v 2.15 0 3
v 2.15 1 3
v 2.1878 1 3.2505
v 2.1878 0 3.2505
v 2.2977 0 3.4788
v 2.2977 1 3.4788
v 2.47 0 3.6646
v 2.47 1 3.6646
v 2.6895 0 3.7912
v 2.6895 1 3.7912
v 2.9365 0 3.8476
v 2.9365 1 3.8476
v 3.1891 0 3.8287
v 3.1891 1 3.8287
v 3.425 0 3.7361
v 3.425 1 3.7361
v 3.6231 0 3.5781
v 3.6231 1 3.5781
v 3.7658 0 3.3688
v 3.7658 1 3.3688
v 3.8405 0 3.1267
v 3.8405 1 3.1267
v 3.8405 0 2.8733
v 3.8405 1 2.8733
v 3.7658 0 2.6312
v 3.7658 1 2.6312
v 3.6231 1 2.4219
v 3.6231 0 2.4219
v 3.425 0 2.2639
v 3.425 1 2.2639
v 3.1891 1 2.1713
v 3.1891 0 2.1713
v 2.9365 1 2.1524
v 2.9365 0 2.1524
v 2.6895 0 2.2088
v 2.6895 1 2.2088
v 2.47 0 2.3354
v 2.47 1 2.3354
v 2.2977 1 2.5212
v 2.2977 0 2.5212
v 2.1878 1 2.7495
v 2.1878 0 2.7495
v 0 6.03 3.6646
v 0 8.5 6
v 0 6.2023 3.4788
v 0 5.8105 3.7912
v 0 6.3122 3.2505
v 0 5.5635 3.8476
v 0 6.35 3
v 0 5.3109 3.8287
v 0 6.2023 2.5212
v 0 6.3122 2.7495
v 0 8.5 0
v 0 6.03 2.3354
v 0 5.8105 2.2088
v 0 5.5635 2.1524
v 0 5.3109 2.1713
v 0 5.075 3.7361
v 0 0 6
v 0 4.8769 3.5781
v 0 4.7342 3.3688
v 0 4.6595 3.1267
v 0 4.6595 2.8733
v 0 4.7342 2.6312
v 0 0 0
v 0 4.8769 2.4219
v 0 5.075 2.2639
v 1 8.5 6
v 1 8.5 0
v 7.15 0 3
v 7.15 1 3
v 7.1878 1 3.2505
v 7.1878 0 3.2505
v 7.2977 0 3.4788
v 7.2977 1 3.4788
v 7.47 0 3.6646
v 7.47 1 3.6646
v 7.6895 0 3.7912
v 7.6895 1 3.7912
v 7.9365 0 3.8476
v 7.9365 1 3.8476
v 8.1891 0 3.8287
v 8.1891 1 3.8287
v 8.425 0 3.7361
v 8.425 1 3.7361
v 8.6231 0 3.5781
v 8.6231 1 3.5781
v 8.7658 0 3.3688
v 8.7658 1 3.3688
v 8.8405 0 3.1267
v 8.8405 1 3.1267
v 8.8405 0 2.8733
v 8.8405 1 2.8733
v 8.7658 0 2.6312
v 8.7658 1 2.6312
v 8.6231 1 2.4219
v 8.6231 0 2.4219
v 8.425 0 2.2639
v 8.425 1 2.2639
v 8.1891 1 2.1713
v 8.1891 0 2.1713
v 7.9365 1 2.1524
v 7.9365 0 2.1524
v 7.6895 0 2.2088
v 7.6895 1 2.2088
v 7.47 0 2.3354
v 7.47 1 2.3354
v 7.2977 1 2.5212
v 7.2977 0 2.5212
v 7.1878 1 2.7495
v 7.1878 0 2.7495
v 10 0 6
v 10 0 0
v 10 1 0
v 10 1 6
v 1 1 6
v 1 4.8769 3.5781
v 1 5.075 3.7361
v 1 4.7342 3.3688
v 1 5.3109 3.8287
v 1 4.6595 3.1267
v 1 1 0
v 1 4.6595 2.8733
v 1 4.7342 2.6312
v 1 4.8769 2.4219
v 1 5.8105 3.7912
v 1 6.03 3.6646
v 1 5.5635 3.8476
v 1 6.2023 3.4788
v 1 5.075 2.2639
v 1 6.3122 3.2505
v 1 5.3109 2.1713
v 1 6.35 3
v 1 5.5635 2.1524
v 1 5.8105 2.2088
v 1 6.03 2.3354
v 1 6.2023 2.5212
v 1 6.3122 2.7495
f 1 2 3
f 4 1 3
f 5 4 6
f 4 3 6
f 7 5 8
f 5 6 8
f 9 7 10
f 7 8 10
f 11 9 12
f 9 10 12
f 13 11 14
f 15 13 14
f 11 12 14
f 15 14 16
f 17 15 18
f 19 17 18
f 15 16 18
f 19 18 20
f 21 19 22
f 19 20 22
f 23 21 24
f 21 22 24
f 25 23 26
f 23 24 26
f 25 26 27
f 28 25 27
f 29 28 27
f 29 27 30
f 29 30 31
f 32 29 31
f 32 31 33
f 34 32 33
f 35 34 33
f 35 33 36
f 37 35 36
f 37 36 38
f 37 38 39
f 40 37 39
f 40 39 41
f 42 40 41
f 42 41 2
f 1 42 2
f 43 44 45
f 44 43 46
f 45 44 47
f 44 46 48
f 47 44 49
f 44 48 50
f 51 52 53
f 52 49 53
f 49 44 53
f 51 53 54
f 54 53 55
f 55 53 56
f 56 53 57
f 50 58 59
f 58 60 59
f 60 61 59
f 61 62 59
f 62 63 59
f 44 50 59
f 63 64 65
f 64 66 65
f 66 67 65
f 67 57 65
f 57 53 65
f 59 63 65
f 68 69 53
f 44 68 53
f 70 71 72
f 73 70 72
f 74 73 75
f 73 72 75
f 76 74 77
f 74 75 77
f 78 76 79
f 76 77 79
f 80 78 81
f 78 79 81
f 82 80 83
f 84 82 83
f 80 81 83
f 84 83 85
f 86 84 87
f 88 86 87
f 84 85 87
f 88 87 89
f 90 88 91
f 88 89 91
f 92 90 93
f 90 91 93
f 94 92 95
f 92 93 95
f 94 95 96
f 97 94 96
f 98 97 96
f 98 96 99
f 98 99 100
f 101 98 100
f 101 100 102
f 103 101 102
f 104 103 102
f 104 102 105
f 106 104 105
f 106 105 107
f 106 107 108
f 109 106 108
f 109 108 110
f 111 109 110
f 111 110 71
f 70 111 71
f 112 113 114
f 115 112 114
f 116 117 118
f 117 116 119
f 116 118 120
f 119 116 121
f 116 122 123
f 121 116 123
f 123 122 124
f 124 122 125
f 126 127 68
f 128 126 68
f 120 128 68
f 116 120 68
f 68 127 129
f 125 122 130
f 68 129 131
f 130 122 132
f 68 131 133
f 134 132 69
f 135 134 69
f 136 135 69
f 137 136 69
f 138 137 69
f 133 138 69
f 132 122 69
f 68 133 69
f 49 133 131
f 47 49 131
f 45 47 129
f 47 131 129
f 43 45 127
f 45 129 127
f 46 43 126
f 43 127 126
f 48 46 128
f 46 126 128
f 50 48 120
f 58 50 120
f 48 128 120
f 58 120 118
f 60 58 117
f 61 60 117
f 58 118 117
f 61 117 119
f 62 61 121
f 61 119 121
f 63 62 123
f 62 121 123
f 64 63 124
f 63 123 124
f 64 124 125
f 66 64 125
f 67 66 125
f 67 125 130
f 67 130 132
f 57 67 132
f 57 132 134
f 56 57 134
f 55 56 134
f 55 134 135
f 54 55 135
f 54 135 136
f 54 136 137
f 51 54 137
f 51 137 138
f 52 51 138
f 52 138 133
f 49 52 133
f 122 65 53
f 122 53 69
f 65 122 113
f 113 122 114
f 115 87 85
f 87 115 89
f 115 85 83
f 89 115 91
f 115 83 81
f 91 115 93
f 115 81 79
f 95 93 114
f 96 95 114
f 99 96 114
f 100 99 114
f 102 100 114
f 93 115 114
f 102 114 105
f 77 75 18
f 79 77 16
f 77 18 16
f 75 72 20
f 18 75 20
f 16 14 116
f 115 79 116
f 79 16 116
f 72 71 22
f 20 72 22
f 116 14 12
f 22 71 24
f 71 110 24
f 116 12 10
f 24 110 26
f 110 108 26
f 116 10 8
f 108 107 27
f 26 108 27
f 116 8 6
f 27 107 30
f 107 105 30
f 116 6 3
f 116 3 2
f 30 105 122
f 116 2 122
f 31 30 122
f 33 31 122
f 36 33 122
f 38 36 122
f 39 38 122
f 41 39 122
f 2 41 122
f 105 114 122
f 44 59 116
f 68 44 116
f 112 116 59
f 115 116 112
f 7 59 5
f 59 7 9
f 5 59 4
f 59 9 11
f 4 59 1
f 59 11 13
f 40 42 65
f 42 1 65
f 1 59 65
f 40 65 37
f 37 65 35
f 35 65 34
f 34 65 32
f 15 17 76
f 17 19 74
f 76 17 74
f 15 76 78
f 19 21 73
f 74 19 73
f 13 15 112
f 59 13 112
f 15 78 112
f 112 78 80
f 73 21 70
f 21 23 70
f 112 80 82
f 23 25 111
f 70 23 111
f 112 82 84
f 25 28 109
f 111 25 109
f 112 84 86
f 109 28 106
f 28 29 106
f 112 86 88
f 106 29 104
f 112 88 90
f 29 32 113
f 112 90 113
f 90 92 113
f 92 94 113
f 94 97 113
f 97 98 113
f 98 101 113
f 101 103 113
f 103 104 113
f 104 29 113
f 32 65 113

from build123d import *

# Parameters (mm, degrees)
BOSS_EXTRUDE2_DEPTH = 6
SKETCH4_R           = 0.85
CUT_EXTRUDE1_DEPTH  = 6
SKETCH6_R           = 0.85
CUT_EXTRUDE2_DEPTH  = 6


with BuildPart() as part:
    # Sketch3 → Boss-Extrude2 (new body)
    with BuildSketch(Plane.XY):
        Polygon((0, 0), (10, 0), (10, 1), (1, 1), (1, 8.5), (0, 8.5), align=None)
    extrude(amount=BOSS_EXTRUDE2_DEPTH)

    # Sketch4 → Cut-Extrude1 (cut)
    with BuildSketch(Plane(origin=(1, 0, 0), x_dir=(0, 0, -1), z_dir=(1, 0, 0))):
        with Locations(Location((-3, 5.5, 0), (0, 0, 90))):
            Circle(SKETCH4_R)
    extrude(amount=-CUT_EXTRUDE1_DEPTH, mode=Mode.SUBTRACT)

    # Sketch6 → Cut-Extrude2 (cut)
    with BuildSketch(Plane(origin=(0, 1, 0), x_dir=(1, 0, 0), z_dir=(0, 1, 0))):
        with Locations(Location((3, -3, 0), (0, 0, 180))):
            Circle(SKETCH6_R)
        with Locations(Location((8, -3, 0), (0, 0, 180))):
            Circle(SKETCH6_R)
    extrude(amount=-CUT_EXTRUDE2_DEPTH, mode=Mode.SUBTRACT)


solid = part.part
